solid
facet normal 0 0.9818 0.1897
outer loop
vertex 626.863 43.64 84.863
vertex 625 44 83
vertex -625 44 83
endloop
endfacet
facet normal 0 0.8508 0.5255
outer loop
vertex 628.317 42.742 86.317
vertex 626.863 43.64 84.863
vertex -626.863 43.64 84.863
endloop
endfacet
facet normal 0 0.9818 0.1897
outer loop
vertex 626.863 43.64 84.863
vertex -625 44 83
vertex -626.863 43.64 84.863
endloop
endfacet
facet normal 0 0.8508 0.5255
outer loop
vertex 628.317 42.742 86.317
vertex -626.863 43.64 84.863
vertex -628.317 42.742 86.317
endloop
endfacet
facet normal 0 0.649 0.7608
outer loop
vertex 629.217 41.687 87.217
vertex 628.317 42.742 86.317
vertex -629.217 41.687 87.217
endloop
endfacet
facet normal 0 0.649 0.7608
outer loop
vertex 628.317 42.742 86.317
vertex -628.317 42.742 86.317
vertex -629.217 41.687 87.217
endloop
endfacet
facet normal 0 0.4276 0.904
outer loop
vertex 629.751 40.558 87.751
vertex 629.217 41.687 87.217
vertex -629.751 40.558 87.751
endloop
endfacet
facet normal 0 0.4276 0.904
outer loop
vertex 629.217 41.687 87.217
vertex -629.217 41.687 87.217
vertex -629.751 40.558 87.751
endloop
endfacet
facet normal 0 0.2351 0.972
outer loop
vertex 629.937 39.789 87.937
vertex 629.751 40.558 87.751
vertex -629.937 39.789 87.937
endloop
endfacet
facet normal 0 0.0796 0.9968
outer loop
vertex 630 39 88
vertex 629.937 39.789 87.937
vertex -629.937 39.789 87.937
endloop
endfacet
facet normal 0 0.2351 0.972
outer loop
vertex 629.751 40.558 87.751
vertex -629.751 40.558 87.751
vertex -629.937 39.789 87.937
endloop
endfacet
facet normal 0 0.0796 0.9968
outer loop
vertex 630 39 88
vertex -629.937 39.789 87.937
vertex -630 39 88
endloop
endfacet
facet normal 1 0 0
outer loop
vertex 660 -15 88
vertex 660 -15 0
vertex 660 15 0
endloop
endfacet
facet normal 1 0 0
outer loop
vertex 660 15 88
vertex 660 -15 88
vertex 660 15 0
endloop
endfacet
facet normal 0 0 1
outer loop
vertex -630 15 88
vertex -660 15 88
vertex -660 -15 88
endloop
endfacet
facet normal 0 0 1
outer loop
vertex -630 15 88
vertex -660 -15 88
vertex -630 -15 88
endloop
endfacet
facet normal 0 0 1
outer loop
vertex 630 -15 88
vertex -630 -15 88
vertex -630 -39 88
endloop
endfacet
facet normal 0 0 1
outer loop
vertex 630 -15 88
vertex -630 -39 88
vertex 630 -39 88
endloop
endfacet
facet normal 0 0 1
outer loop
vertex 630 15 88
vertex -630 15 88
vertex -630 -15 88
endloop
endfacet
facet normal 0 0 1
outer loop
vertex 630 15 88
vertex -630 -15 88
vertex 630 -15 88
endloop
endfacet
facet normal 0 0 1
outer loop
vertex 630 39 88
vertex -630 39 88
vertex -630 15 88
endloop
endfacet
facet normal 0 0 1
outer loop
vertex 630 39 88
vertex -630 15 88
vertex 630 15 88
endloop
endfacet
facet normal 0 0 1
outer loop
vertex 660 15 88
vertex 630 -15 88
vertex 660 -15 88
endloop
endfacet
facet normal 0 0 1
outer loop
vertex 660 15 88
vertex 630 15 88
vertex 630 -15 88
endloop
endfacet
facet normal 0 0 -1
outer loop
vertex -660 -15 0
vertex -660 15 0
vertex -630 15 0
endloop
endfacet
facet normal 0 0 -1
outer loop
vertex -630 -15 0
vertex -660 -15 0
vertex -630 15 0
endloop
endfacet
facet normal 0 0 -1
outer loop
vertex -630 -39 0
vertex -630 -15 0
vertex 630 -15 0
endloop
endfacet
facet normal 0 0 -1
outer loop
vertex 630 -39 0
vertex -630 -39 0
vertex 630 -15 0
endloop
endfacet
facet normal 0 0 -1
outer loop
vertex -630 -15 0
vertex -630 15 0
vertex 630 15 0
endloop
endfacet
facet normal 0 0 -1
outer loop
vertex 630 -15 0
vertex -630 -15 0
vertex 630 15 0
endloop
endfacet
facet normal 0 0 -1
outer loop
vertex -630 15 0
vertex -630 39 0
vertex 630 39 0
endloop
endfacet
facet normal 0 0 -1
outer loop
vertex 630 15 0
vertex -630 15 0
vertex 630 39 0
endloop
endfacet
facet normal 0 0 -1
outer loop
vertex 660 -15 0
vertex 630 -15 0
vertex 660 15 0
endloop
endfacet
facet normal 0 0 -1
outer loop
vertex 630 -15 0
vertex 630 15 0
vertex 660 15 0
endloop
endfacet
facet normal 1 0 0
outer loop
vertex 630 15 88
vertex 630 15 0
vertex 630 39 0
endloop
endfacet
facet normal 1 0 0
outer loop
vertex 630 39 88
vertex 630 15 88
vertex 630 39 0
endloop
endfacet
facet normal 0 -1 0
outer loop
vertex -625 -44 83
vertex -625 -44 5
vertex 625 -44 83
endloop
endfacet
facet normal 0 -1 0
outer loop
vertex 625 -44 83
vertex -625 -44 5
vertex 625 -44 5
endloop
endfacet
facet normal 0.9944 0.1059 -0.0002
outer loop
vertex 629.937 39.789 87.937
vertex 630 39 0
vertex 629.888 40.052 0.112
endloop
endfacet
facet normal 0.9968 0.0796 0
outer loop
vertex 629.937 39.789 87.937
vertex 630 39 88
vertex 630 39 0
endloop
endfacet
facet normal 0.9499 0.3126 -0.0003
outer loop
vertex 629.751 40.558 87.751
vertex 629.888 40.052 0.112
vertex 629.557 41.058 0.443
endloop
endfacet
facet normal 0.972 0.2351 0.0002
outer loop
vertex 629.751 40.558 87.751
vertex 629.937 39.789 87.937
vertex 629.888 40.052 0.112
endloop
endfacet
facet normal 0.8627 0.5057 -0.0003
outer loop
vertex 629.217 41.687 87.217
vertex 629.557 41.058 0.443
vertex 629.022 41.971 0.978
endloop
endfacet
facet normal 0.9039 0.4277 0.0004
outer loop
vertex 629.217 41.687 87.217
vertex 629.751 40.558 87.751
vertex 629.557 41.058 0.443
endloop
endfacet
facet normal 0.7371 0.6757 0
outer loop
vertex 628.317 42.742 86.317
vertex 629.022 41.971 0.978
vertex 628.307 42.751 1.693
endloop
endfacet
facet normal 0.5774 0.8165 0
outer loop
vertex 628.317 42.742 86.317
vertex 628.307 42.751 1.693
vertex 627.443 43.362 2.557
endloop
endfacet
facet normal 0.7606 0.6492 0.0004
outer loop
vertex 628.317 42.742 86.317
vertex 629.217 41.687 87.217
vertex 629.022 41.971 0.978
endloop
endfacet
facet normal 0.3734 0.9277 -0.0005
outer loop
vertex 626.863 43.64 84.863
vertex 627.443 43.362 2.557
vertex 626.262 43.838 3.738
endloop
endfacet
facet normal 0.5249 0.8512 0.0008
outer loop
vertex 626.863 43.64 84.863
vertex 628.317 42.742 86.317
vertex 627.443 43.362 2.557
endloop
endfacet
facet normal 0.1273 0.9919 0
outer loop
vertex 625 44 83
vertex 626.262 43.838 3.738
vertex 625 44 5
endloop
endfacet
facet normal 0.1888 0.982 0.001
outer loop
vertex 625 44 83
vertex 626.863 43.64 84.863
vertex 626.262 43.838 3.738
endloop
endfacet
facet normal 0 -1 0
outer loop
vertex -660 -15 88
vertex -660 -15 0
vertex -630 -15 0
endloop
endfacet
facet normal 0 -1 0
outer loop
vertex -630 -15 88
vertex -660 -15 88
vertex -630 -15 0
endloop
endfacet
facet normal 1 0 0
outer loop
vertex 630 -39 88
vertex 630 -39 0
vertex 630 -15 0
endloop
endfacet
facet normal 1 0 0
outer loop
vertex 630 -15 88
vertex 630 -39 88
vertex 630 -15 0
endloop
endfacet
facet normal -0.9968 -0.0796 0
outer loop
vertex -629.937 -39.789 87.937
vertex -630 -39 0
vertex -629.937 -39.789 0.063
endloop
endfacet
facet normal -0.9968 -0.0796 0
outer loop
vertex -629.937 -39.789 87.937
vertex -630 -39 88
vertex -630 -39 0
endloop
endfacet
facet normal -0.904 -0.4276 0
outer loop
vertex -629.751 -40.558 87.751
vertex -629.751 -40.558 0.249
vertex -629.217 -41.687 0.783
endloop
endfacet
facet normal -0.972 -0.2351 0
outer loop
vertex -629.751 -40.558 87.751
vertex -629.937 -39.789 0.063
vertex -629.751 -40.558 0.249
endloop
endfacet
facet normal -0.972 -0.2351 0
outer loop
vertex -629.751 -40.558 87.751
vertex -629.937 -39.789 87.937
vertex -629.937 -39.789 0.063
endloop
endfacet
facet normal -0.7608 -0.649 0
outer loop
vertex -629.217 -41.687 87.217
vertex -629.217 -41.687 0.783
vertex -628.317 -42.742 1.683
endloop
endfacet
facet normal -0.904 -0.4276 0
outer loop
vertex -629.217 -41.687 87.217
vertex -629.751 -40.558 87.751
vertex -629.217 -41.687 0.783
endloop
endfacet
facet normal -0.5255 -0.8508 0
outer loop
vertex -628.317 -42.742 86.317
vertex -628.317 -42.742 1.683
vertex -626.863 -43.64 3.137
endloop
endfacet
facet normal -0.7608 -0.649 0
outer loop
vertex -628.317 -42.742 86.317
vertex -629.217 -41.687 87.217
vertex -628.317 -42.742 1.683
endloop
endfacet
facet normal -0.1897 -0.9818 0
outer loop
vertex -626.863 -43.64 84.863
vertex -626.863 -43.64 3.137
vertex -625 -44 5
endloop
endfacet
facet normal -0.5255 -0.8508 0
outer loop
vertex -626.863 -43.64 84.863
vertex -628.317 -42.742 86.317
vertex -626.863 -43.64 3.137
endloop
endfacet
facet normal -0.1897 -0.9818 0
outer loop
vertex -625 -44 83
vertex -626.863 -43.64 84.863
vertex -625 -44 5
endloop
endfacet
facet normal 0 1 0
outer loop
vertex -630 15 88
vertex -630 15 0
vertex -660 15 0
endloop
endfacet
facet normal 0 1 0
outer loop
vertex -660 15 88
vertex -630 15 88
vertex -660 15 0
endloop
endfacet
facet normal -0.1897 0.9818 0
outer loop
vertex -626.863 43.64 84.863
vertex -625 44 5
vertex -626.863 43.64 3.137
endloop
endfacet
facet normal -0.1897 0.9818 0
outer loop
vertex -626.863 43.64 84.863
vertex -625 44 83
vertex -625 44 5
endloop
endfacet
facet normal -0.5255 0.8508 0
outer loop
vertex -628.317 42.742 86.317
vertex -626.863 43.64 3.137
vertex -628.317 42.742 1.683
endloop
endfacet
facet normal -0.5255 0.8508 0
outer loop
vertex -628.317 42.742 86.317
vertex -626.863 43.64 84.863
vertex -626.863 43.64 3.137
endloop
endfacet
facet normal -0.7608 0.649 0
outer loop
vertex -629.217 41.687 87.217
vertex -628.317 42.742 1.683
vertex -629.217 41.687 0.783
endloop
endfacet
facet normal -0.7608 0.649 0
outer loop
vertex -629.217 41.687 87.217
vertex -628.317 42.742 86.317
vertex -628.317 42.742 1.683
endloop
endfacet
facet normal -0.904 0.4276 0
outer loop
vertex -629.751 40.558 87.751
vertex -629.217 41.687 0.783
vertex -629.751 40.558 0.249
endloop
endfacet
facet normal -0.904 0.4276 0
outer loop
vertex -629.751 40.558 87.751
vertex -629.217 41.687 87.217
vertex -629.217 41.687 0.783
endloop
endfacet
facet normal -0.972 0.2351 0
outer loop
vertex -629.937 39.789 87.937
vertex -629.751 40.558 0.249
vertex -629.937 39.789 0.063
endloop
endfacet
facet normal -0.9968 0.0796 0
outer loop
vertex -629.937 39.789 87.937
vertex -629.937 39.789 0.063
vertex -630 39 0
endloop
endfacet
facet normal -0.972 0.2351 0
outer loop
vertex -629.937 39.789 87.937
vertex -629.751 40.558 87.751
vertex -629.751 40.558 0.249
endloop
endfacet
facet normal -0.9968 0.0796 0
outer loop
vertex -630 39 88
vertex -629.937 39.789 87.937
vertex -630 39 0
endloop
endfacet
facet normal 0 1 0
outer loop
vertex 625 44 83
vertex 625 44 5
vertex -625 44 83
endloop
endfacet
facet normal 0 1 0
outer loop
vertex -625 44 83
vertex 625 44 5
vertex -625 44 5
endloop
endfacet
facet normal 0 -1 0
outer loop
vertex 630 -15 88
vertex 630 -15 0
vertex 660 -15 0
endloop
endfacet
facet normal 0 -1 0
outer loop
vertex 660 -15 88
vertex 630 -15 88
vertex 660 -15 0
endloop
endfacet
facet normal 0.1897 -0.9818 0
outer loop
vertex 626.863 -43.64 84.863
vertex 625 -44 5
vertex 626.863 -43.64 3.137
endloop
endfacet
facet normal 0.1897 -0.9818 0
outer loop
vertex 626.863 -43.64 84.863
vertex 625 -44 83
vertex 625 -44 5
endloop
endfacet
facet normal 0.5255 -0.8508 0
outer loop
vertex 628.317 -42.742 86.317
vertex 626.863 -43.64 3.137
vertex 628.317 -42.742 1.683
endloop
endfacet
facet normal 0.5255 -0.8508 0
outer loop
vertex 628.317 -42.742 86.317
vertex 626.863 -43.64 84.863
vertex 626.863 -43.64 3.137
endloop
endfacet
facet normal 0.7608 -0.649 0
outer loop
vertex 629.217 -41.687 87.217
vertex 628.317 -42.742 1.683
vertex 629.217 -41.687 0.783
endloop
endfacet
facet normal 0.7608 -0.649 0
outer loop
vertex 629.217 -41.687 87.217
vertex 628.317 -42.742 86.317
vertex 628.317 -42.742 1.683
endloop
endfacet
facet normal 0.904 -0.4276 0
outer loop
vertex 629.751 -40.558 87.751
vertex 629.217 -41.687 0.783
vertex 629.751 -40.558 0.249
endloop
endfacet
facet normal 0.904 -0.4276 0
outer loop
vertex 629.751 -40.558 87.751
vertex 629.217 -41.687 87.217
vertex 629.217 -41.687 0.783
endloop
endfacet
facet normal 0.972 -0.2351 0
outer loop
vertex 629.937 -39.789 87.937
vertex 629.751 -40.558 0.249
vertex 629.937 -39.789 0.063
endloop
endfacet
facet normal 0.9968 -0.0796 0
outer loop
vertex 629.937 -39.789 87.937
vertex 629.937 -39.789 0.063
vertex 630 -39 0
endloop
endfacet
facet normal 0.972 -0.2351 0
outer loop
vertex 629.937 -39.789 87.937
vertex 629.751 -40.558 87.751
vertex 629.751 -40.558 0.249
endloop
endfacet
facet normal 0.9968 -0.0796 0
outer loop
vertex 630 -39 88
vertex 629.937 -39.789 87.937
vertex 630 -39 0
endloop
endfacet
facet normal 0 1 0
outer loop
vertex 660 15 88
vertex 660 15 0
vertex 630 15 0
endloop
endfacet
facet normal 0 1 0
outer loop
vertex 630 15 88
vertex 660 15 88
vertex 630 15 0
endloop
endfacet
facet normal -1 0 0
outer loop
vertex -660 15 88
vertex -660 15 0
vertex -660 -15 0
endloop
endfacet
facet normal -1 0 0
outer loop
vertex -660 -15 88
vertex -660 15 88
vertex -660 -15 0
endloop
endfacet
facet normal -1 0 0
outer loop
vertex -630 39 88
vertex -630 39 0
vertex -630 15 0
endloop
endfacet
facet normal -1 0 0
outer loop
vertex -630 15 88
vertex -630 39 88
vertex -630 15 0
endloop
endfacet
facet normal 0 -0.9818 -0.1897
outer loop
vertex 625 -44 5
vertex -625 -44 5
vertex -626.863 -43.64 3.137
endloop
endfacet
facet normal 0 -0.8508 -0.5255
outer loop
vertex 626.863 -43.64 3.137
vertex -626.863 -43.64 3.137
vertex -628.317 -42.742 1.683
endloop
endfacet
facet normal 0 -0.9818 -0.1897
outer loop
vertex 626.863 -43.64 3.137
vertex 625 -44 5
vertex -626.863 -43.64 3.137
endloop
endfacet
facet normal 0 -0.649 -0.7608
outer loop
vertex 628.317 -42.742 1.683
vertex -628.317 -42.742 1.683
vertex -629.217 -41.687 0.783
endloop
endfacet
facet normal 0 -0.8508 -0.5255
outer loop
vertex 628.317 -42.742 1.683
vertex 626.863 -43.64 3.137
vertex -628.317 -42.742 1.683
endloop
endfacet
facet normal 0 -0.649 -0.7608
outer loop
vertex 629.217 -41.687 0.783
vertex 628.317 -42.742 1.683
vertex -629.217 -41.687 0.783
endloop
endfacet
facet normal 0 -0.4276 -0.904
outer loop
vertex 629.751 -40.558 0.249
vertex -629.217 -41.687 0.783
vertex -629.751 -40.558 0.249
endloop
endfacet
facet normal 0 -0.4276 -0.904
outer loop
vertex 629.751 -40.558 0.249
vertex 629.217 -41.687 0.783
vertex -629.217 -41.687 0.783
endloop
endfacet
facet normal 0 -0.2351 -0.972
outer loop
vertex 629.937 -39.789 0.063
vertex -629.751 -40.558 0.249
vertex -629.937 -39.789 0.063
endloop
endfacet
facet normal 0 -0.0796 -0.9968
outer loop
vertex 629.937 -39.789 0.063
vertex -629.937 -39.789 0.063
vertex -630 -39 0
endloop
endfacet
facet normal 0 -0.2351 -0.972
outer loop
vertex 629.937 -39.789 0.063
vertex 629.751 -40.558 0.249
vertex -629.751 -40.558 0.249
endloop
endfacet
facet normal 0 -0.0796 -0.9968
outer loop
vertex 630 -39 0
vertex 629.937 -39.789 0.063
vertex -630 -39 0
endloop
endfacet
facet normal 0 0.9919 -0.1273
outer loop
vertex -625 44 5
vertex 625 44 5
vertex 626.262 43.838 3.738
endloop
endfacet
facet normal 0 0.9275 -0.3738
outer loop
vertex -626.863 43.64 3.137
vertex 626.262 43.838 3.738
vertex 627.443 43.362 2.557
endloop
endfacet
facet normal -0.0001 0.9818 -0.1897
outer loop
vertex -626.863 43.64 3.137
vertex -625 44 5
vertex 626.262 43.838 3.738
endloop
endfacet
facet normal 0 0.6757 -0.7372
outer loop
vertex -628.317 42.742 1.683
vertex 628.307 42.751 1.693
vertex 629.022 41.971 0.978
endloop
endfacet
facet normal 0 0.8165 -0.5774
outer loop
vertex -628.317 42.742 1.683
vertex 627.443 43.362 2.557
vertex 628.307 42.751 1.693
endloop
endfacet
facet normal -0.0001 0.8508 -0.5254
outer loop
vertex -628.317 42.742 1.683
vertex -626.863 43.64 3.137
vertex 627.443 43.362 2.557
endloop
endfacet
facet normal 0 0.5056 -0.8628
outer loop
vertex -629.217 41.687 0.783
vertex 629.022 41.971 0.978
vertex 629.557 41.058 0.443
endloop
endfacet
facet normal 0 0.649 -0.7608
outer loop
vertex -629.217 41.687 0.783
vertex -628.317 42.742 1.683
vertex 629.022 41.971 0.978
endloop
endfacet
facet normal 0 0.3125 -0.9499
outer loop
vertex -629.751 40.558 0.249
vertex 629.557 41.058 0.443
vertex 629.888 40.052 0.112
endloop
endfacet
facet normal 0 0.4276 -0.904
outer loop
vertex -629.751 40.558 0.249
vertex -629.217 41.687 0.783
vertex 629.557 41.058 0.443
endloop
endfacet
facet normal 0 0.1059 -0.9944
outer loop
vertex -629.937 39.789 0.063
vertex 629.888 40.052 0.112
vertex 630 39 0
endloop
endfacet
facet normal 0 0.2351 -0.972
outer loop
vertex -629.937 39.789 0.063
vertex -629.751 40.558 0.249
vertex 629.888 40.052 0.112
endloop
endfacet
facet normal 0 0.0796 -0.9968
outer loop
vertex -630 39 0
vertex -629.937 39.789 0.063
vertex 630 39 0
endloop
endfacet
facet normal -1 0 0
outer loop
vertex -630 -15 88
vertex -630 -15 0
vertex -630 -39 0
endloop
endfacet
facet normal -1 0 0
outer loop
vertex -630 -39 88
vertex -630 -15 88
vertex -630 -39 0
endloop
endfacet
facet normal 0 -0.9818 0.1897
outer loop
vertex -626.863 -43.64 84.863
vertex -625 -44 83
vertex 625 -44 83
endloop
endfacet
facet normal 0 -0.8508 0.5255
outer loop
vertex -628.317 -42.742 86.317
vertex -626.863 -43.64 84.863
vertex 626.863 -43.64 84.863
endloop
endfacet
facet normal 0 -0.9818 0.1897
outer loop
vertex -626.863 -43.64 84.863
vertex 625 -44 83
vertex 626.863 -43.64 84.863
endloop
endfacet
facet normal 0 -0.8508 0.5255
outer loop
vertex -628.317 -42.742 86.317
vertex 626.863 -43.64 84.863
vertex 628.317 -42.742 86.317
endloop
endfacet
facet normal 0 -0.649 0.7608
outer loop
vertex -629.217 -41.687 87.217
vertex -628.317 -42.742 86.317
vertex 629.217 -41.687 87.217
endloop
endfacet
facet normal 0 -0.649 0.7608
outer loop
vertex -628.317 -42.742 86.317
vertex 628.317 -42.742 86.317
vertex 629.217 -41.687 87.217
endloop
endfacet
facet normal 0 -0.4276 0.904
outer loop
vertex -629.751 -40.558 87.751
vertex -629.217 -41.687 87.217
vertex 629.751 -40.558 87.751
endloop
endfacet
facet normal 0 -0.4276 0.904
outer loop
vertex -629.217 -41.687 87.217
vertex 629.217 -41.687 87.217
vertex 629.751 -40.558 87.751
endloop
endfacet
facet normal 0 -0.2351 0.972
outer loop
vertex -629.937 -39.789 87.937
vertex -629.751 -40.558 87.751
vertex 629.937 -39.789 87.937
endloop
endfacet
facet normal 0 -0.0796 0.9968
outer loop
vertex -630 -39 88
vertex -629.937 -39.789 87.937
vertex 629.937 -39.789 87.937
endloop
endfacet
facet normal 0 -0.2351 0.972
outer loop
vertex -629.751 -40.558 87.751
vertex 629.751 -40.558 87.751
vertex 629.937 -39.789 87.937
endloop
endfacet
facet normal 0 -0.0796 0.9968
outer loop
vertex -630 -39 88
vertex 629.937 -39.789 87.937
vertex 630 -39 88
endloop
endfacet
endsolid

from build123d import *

# Parameters (mm, degrees)
F1_DEPTH = 88
F2_R     = 5


with BuildPart() as f1:
    # F0 (on Top) → F1 (new body)
    with BuildSketch(Plane.XY):
        Polygon((-630, -15), (-630, -44), (630, -44), (630, -15), (660, -15), (660, 15), (630, 15), (630, 44), (-630, 44), (-630, 15), (-660, 15), (-660, -15), align=None)
    extrude(amount=F1_DEPTH)

    # F2
    f2_edges = [f1.edges().sort_by_distance(p)[0] for p in [
        (0, -44, 0),
        (0, -44, 88),
        (0, 44, 88),
        (630, -44, 44),
        (630, 44, 44),
        (0, 44, 0),
        (-630, 44, 44),
        (-630, -44, 44),
    ]]
    fillet(f2_edges, radius=F2_R)


solid = f1.part
